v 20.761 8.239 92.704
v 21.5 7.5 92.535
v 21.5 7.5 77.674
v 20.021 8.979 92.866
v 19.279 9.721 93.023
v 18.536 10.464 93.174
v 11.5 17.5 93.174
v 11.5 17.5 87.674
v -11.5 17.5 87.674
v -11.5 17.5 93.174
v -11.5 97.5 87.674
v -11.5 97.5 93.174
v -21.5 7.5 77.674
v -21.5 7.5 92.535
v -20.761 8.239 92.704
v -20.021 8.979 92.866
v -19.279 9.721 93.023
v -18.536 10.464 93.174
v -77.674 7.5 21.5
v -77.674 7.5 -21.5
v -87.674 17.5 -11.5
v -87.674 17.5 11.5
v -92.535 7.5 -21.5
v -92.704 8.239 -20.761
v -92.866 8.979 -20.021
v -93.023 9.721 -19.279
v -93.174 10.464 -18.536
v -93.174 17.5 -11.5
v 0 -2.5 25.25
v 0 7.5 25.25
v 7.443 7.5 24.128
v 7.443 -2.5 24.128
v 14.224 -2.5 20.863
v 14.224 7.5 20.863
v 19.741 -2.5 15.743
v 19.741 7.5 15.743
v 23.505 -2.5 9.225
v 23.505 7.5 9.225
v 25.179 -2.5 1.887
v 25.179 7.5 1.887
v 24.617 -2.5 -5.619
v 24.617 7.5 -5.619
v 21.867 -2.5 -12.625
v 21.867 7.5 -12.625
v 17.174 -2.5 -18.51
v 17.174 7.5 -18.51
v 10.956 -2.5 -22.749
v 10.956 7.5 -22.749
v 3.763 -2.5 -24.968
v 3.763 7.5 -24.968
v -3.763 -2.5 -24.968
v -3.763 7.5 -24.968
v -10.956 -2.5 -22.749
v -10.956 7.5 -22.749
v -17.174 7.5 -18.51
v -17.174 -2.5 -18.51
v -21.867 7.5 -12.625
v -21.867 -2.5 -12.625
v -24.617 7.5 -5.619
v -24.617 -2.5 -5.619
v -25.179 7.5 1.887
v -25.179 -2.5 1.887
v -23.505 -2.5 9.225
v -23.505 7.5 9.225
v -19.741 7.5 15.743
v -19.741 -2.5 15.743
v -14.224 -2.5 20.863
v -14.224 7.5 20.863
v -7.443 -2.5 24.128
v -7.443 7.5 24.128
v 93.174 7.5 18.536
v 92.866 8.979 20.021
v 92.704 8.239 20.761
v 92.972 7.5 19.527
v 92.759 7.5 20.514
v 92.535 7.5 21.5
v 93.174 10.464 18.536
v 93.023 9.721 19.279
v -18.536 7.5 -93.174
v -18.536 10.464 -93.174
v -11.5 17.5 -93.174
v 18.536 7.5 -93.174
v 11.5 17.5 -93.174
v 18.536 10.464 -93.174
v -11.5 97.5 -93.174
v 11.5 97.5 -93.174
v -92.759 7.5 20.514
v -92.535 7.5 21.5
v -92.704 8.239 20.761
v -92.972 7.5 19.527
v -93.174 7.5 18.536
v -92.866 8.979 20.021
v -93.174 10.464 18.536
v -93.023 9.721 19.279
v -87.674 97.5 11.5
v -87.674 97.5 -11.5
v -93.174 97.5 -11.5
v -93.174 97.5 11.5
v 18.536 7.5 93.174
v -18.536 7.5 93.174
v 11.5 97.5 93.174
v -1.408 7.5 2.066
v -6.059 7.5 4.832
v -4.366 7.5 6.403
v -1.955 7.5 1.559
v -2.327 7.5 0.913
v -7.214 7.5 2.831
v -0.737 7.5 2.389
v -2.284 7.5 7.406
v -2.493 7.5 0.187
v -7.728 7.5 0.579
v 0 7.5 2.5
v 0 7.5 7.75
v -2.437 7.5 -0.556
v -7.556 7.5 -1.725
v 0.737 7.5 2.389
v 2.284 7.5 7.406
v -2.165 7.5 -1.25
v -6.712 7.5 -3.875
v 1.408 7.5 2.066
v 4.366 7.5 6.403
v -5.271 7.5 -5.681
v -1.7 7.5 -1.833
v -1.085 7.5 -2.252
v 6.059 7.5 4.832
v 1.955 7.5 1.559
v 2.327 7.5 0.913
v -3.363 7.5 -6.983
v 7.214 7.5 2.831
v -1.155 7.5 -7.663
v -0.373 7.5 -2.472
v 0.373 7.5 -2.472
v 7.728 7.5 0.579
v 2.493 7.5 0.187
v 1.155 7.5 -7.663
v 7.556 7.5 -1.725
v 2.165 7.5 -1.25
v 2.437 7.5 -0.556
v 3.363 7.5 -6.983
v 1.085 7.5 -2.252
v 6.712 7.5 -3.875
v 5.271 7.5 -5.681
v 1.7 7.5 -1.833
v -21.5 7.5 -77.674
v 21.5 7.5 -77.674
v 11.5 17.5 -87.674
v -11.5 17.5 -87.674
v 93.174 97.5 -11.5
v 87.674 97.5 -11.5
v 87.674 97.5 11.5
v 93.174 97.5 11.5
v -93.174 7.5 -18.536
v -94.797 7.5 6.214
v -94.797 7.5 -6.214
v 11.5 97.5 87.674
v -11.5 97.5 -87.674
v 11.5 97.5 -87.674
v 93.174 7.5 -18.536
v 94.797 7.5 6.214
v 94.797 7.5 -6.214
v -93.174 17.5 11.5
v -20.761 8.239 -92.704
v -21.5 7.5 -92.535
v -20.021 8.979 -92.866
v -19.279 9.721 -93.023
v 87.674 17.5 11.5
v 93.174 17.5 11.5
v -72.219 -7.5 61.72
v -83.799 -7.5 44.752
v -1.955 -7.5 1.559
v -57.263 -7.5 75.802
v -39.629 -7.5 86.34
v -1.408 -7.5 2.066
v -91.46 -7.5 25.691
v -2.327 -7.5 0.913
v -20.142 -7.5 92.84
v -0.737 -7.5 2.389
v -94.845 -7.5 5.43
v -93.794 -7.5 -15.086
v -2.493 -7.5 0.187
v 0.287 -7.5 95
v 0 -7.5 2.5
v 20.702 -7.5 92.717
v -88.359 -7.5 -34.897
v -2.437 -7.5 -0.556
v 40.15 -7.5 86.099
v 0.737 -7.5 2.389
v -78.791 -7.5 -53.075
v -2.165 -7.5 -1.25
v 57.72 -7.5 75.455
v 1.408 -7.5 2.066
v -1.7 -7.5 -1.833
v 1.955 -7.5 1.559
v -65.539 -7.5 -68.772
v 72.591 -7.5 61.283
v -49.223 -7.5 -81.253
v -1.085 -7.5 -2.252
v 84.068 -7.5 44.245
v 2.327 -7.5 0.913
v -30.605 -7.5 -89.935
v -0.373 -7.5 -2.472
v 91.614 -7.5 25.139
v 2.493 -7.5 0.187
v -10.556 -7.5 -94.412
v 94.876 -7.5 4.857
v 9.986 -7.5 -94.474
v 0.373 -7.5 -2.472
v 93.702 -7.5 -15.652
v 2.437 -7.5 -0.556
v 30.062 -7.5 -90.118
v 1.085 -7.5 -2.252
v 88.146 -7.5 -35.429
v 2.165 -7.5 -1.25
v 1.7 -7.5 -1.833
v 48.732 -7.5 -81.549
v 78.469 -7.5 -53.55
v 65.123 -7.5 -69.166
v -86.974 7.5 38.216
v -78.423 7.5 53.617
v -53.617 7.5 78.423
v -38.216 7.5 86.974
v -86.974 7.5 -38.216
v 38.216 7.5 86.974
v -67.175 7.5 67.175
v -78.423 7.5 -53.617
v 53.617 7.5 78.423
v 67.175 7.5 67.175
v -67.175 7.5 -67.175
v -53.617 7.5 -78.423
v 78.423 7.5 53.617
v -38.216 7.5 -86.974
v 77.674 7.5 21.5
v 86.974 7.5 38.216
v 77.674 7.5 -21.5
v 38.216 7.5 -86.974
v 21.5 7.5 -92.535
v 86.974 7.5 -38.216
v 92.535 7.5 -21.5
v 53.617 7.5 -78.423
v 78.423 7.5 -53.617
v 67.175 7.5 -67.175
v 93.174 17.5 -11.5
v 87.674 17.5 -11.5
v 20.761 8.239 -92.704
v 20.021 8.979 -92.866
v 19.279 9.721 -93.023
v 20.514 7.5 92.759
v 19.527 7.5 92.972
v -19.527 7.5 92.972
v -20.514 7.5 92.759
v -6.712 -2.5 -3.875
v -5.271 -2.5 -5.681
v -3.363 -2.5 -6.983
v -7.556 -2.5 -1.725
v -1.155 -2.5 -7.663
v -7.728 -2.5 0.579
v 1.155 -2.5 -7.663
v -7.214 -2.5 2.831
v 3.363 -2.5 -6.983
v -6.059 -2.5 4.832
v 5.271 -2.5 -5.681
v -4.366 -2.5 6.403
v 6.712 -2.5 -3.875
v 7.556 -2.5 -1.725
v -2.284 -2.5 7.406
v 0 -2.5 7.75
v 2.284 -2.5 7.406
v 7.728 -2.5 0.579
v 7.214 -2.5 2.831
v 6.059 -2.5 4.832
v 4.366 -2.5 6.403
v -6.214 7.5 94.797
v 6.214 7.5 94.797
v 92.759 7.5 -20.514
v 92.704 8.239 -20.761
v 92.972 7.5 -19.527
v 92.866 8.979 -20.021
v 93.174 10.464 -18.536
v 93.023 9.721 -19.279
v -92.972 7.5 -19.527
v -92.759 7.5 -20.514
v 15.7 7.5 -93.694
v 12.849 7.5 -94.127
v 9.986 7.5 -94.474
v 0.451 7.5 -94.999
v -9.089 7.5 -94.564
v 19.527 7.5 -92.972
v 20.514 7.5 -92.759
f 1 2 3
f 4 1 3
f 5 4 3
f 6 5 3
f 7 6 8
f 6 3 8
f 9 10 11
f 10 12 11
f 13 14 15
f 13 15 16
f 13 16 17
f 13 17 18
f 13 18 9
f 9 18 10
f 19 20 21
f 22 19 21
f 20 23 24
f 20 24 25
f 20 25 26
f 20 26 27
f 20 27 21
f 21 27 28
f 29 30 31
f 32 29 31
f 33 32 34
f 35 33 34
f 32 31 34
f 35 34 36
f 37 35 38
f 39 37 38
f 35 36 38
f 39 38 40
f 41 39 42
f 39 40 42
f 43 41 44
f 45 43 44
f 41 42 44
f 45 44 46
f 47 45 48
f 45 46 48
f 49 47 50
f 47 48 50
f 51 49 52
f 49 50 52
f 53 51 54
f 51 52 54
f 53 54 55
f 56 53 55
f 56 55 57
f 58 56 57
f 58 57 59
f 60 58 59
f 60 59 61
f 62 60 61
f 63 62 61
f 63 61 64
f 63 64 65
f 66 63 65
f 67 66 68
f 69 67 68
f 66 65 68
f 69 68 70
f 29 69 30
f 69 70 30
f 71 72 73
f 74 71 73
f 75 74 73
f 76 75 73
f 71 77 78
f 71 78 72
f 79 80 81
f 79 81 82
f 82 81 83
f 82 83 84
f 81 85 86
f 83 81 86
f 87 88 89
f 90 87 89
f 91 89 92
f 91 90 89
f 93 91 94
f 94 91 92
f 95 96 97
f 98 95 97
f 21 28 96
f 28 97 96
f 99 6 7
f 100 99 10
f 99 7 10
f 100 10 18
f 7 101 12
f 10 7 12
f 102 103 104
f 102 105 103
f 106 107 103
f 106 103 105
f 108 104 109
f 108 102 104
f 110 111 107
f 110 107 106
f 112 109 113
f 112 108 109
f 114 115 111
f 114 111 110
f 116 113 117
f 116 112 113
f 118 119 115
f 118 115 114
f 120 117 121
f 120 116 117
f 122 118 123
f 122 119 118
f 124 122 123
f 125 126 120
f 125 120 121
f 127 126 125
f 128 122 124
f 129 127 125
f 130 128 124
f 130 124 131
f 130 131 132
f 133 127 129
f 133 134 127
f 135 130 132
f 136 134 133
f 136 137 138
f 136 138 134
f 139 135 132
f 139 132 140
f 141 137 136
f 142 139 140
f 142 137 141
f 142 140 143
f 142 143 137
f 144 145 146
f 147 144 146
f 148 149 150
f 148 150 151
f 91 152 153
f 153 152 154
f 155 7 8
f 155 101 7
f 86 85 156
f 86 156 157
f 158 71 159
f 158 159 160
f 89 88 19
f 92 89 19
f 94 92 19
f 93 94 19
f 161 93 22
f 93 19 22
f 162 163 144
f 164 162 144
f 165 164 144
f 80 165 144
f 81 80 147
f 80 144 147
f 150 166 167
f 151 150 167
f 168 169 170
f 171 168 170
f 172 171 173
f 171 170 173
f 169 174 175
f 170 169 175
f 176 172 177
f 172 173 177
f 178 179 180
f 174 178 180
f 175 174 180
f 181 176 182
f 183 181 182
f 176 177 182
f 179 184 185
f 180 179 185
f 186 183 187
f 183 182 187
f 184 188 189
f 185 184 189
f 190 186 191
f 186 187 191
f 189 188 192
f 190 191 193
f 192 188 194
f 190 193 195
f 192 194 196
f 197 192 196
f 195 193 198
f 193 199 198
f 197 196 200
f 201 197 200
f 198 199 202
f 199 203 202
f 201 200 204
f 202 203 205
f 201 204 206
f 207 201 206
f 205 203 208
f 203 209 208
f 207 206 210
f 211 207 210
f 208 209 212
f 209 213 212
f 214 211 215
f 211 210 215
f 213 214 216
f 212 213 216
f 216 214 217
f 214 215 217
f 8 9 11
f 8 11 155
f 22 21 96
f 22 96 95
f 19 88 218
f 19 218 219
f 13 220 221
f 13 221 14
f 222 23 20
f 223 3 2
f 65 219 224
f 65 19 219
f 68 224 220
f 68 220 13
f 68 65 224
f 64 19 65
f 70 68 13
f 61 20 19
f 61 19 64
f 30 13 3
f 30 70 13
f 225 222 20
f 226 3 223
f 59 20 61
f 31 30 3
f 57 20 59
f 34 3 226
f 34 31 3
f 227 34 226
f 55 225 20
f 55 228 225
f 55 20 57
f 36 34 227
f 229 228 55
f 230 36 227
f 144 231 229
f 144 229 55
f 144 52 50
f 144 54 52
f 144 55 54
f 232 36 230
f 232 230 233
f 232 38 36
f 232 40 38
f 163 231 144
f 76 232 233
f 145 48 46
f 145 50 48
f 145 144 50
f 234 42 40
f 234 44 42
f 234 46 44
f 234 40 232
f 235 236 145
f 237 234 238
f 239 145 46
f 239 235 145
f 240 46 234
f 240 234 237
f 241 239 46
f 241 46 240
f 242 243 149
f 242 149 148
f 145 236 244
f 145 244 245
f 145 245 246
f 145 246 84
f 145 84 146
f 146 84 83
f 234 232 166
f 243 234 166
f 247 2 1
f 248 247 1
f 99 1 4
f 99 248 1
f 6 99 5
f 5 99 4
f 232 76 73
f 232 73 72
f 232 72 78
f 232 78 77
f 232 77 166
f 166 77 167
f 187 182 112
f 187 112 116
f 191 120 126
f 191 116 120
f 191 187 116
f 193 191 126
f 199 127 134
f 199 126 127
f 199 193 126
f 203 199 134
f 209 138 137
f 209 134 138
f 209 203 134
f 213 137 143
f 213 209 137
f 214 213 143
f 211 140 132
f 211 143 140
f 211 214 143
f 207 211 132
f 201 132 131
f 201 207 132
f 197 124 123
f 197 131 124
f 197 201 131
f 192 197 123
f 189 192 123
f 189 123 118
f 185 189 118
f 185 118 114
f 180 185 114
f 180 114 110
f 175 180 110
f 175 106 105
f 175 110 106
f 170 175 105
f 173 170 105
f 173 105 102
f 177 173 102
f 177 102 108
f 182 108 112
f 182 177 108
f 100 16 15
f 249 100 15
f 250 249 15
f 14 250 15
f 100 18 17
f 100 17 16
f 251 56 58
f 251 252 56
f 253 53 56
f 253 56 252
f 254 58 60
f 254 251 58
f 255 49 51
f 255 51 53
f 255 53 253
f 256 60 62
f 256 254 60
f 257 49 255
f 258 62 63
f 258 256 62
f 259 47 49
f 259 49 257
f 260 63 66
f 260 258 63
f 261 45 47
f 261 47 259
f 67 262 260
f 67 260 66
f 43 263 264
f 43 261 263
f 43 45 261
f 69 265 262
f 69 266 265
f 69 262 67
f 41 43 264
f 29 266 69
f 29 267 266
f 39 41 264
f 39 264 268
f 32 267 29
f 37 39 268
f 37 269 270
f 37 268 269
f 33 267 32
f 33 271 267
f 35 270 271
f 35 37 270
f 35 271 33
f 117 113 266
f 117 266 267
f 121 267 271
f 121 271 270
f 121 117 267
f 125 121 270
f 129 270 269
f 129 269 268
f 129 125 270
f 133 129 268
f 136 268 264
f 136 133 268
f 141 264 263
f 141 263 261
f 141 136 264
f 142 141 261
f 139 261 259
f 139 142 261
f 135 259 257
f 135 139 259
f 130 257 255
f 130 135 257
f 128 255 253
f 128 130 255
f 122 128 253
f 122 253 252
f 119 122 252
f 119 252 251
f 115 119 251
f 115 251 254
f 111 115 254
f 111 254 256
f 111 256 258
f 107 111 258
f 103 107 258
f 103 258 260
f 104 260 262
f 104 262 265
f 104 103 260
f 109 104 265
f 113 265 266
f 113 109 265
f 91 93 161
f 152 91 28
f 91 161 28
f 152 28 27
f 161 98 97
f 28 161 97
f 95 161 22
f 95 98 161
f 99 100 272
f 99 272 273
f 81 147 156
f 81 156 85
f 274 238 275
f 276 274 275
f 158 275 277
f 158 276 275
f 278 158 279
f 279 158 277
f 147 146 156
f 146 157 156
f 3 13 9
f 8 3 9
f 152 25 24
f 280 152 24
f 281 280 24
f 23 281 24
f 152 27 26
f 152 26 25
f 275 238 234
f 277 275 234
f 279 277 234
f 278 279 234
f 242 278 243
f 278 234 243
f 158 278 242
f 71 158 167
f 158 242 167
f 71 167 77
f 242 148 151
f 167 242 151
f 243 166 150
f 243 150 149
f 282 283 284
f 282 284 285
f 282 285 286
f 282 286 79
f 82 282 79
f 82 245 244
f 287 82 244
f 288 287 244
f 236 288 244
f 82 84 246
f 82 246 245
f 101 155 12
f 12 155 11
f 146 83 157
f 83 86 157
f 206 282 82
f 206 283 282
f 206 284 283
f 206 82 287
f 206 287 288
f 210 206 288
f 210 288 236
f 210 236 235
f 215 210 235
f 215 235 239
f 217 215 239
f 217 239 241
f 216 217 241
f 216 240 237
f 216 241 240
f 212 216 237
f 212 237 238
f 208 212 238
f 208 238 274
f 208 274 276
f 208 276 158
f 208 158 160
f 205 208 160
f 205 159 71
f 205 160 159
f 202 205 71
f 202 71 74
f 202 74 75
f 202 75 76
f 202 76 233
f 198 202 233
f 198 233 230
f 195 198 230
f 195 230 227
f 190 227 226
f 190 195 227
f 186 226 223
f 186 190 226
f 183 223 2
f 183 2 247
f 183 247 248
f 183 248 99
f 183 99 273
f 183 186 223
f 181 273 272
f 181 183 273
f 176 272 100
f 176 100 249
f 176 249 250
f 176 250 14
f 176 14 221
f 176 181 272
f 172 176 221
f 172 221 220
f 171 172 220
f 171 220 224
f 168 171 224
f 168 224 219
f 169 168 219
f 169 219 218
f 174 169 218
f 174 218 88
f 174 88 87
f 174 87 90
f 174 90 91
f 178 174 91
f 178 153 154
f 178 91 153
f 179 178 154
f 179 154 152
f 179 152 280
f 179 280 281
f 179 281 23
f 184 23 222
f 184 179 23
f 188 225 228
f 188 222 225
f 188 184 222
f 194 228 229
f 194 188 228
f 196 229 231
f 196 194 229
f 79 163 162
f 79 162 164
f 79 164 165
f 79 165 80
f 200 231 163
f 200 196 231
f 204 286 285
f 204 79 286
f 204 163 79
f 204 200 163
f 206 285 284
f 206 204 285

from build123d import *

# Parameters (mm, degrees)
BOSS_EXTRUDE1_DEPTH     = 7.5
SKETCH2_W               = 23
SKETCH2_H               = 5.500000000000014
SKETCH2_W_2             = 5.5
SKETCH2_H_2             = 23
BOSS_EXTRUDE2_DEPTH     = 90
SKETCH3_R               = 25.25
SKETCH3_R_2             = 7.75
CUT_EXTRUDE1_DEPTH      = 10
CUT_EXTRUDE2_DEPTH      = 162.70961628796235
CUT_EXTRUDE2_DEPTH_BACK = 162.70961628796235
SKETCH4_R               = 2.5
CHAMFER1_SIZE           = 10


with BuildPart() as part:
    # Sketch1 → Boss-Extrude1 (new, symmetric)
    with BuildSketch(Plane(origin=(0, 0, 0), x_dir=(1, 0, 0), z_dir=(0, 1, 0))):
        with BuildLine():
            ThreePointArc((-9.98613997947909, 94.47368421052632), (-82.27241335952168, 47.49999999999999), (-86.80968050516414, -38.58859119728691))
            ThreePointArc((-86.80968050516414, -38.58859119728691), (-82.27241335952166, -47.500000000000036), (-76.82354052568505, -55.885093013239505))
            ThreePointArc((-76.82354052568505, -55.885093013239505), (4.801e-14, -95.00000000000001), (76.82354052568508, -55.88509301323945))
            ThreePointArc((76.82354052568508, -55.88509301323945), (82.2724133595217, -47.499999999999986), (86.80968050516417, -38.58859119728684))
            ThreePointArc((86.80968050516417, -38.58859119728684), (82.27241335952168, 47.50000000000001), (9.986139979479082, 94.47368421052632))
            ThreePointArc((9.986139979479082, 94.47368421052632), (5.82e-15, 95), (-9.98613997947909, 94.47368421052632))
        make_face()
    extrude(amount=BOSS_EXTRUDE1_DEPTH, both=True)

    # Sketch2 → Boss-Extrude2 (add)
    with BuildSketch(Plane(origin=(0, 7.5, 0), x_dir=(1, 0, 0), z_dir=(0, 1, 0))):
        with Locations((0, 90.42404100918682)):
            Rectangle(SKETCH2_W, SKETCH2_H)
        with Locations((90.42404100918962, 2.14584e-12)):
            Rectangle(SKETCH2_W_2, SKETCH2_H_2)
        Polygon((11.50000000000496, -93.17404100918749), (-11.49999999999504, -93.17404100918749), (-11.499999999995042, -87.67404100918748), (11.500000000004958, -87.67404100918748), align=None)
        Polygon((-93.17404100918469, -11.500000000002824), (-93.17404100918469, 11.499999999997176), (-87.67404100918468, 11.499999999997177), (-87.67404100918468, -11.500000000002823), align=None)
    extrude(amount=BOSS_EXTRUDE2_DEPTH)

    # Sketch3 → Cut-Extrude1 (cut)
    with BuildSketch(Plane(origin=(0, 7.5, 0), x_dir=(1, 0, 0), z_dir=(0, 1, 0))):
        with Locations(Location((0, 0, 0), (0, 0, 270))):
            Circle(SKETCH3_R)
        with Locations(Location((0, 0, 0), (0, 0, 270))):
            Circle(SKETCH3_R_2, mode=Mode.SUBTRACT)
    extrude(amount=-CUT_EXTRUDE1_DEPTH, mode=Mode.SUBTRACT)

    # Sketch4 → Cut-Extrude2 (cut, two sides: drawn at the far end of the back side and taken through both)
    with BuildSketch(Plane(origin=(0, 7.5, 0), x_dir=(1, 0, 0), z_dir=(0, 1, 0)).offset(-CUT_EXTRUDE2_DEPTH_BACK)):
        with Locations(Location((0, 0, 0), (0, 0, 270))):
            Circle(SKETCH4_R)
    extrude(amount=CUT_EXTRUDE2_DEPTH + CUT_EXTRUDE2_DEPTH_BACK, mode=Mode.SUBTRACT)

    # Chamfer1
    # the kernel refuses this chamfer: 10 mm, written as the material it adds along each edge
    with BuildSketch(Plane(origin=(-11.5, 7.5, -87.67404100918681), x_dir=(-0.9996219169112968, -0.027495876610586403, 0), z_dir=(0, 0, -1))) as chamfer1_piece_1_section:
        Polygon((CHAMFER1_SIZE * 0.999621916911, CHAMFER1_SIZE * 0.0274958766106), (-CHAMFER1_SIZE * 0.0274958766106, CHAMFER1_SIZE * 0.999621916911), (0, 0), align=None)
    chamfer1_piece_1 = extrude(amount=5.500000000000014, mode=Mode.PRIVATE)
    chamfer1_piece_1 = chamfer1_piece_1 & Plane(origin=(-7.11e-15, 10.81050074609558, 2.265e-14), x_dir=(-0.10511726294188506, 0, -0.9944598337950139), z_dir=(0, -1, 0)) * Cylinder(95, 51, mode=Mode.PRIVATE)
    add(chamfer1_piece_1)
    with BuildSketch(Plane(origin=(11.5, 7.5, -87.67404100918681), x_dir=(0, -0.027495876610586403, 0.9996219169112968), z_dir=(-1, 0, 0)), Plane(origin=(87.67404100918962, 7.5, 11.499999999997854), x_dir=(-0.9996219169112968, -0.027495876610586403, 0), z_dir=(0, 0, -1)), Plane(origin=(-11.499999999995042, 7.5, 87.67404100918748), x_dir=(0, -0.027495876610586403, -0.9996219169112968), z_dir=(1, 0, 0)), Plane(origin=(-87.67404100918468, 7.5, -11.499999999997177), x_dir=(0.9996219169112968, -0.027495876610586403, 0), z_dir=(0, 0, 1))) as chamfer1_piece_2:
        Polygon((CHAMFER1_SIZE * 0.999621916911, CHAMFER1_SIZE * 0.0274958766106), (-CHAMFER1_SIZE * 0.0274958766106, CHAMFER1_SIZE * 0.999621916911), (0, 0), align=None)
    extrude(amount=23)
    with BuildSketch(Plane(origin=(11.5, 7.5, -93.17404100918682), x_dir=(0.9996219169112968, -0.027495876610586403, 0), z_dir=(0, 0, 1))) as chamfer1_piece_3_section:
        Polygon((CHAMFER1_SIZE * 0.999621916911, CHAMFER1_SIZE * 0.0274958766106), (-CHAMFER1_SIZE * 0.0274958766106, CHAMFER1_SIZE * 0.999621916911), (0, 0), align=None)
    chamfer1_piece_3 = extrude(amount=5.500000000000014, mode=Mode.PRIVATE)
    chamfer1_piece_3 = chamfer1_piece_3 & Plane(origin=(-7.11e-15, 10.810500746107277, 1.066e-14), x_dir=(0.9137861105806754, 0, 0.4061956968135455), z_dir=(0, -1, 0)) * Cylinder(95.00000000000001, 51, mode=Mode.PRIVATE)
    add(chamfer1_piece_3)
    with BuildSketch(Plane(origin=(87.67404100918962, 7.5, -11.500000000002146), x_dir=(0, -0.027495876610586403, -0.9996219169112968), z_dir=(1, 0, 0))) as chamfer1_piece_4_section:
        Polygon((CHAMFER1_SIZE * 0.999621916911, CHAMFER1_SIZE * 0.0274958766106), (-CHAMFER1_SIZE * 0.0274958766106, CHAMFER1_SIZE * 0.999621916911), (0, 0), align=None)
    chamfer1_piece_4 = extrude(amount=5.500000000000014, mode=Mode.PRIVATE)
    chamfer1_piece_4 = chamfer1_piece_4 & Plane(origin=(-7.11e-15, 10.81050074609573, 1.066e-14), x_dir=(0.9137861105806754, 0, 0.4061956968135455), z_dir=(0, -1, 0)) * Cylinder(95.00000000000001, 51, mode=Mode.PRIVATE)
    add(chamfer1_piece_4)
    with BuildSketch(Plane(origin=(93.17404100918964, 7.5, 11.499999999997854), x_dir=(0, -0.027495876610586403, 0.9996219169112968), z_dir=(-1, 0, 0))) as chamfer1_piece_5_section:
        Polygon((CHAMFER1_SIZE * 0.999621916911, CHAMFER1_SIZE * 0.0274958766106), (-CHAMFER1_SIZE * 0.0274958766106, CHAMFER1_SIZE * 0.999621916911), (0, 0), align=None)
    chamfer1_piece_5 = extrude(amount=5.500000000000014, mode=Mode.PRIVATE)
    chamfer1_piece_5 = chamfer1_piece_5 & Plane(origin=(-7.11e-15, 10.81050074610739, 1.066e-14), x_dir=(0.9137861105806754, 0, 0.4061956968135455), z_dir=(0, -1, 0)) * Cylinder(95.00000000000001, 51, mode=Mode.PRIVATE)
    add(chamfer1_piece_5)
    with BuildSketch(Plane(origin=(11.500000000004958, 7.5, 87.67404100918748), x_dir=(0.9996219169112968, -0.0274958766105864, 0), z_dir=(3.2e-16, 0, 1))) as chamfer1_piece_6_section:
        Polygon((CHAMFER1_SIZE * 0.999621916911, CHAMFER1_SIZE * 0.0274958766106), (-CHAMFER1_SIZE * 0.0274958766106, CHAMFER1_SIZE * 0.999621916911), (0, 0), align=None)
    chamfer1_piece_6 = extrude(amount=5.500000000000014, mode=Mode.PRIVATE)
    chamfer1_piece_6 = chamfer1_piece_6 & Plane(origin=(-7.11e-15, 10.810500746095684, 4.263e-14), x_dir=(-0.8086688476387901, 0, 0.5882641369814681), z_dir=(0, -1, 0)) * Cylinder(94.99999999999999, 51, mode=Mode.PRIVATE)
    add(chamfer1_piece_6)
    with BuildSketch(Plane(origin=(-11.49999999999504, 7.5, 93.17404100918749), x_dir=(-0.9996219169112968, -0.027495876610586403, 0), z_dir=(-3.2e-16, 0, -1))) as chamfer1_piece_7_section:
        Polygon((CHAMFER1_SIZE * 0.999621916911, CHAMFER1_SIZE * 0.0274958766106), (-CHAMFER1_SIZE * 0.0274958766106, CHAMFER1_SIZE * 0.999621916911), (0, 0), align=None)
    chamfer1_piece_7 = extrude(amount=5.500000000000014, mode=Mode.PRIVATE)
    chamfer1_piece_7 = chamfer1_piece_7 & Plane(origin=(-7.11e-15, 10.810500746107264, 4.263e-14), x_dir=(-0.8086688476387901, 0, 0.5882641369814681), z_dir=(0, -1, 0)) * Cylinder(94.99999999999999, 51, mode=Mode.PRIVATE)
    add(chamfer1_piece_7)
    with BuildSketch(Plane(origin=(-87.67404100918468, 7.5, 11.500000000002823), x_dir=(0, -0.02749587661058641, 0.9996219169112968), z_dir=(-1, 0, 3.2e-16))) as chamfer1_piece_8_section:
        Polygon((CHAMFER1_SIZE * 0.999621916911, CHAMFER1_SIZE * 0.0274958766106), (-CHAMFER1_SIZE * 0.0274958766106, CHAMFER1_SIZE * 0.999621916911), (0, 0), align=None)
    chamfer1_piece_8 = extrude(amount=5.500000000000014, mode=Mode.PRIVATE)
    chamfer1_piece_8 = chamfer1_piece_8 & Plane(origin=(-7.11e-15, 10.8105007460955, 2.265e-14), x_dir=(-0.10511726294188506, 0, -0.9944598337950139), z_dir=(0, -1, 0)) * Cylinder(95, 51, mode=Mode.PRIVATE)
    add(chamfer1_piece_8)
    with BuildSketch(Plane(origin=(-93.17404100918469, 7.5, -11.499999999997176), x_dir=(0, -0.027495876610586403, -0.9996219169112968), z_dir=(1, 0, -3.2e-16))) as chamfer1_piece_9_section:
        Polygon((CHAMFER1_SIZE * 0.999621916911, CHAMFER1_SIZE * 0.0274958766106), (-CHAMFER1_SIZE * 0.0274958766106, CHAMFER1_SIZE * 0.999621916911), (0, 0), align=None)
    chamfer1_piece_9 = extrude(amount=5.500000000000014, mode=Mode.PRIVATE)
    chamfer1_piece_9 = chamfer1_piece_9 & Plane(origin=(-7.11e-15, 10.810500746107152, 2.265e-14), x_dir=(-0.10511726294188506, 0, -0.9944598337950139), z_dir=(0, -1, 0)) * Cylinder(95, 51, mode=Mode.PRIVATE)
    add(chamfer1_piece_9)
    with BuildSketch(Plane(origin=(-11.5, 7.5, -61.9572111295277), x_dir=(-0.9996219169112968, -0.027495876610586403, 0), z_dir=(0, 0, -1))) as chamfer1_piece_10a_section:
        Polygon((CHAMFER1_SIZE * 0.999621916911, CHAMFER1_SIZE * 0.0274958766106), (-CHAMFER1_SIZE * 0.0274958766106, CHAMFER1_SIZE * 0.999621916911), (0, 0), align=None)
    chamfer1_piece_10a = extrude(amount=31.216829879659123, mode=Mode.PRIVATE)
    chamfer1_piece_10a = split(chamfer1_piece_10a, bisect_by=Plane(origin=(-14.797936268059384, 10.797936268059397, -87.67404100918681), z_dir=(0, 0, 1)), keep=Keep.TOP, mode=Mode.PRIVATE)
    with BuildSketch(Plane(origin=(11.5, 7.5, -87.67404100918681), x_dir=(0, -0.027495876610586403, 0.9996219169112968), z_dir=(-1, 0, 0))) as chamfer1_piece_10b_section:
        Polygon((CHAMFER1_SIZE * 0.999621916911, CHAMFER1_SIZE * 0.0274958766106), (-CHAMFER1_SIZE * 0.0274958766106, CHAMFER1_SIZE * 0.999621916911), (0, 0), align=None)
    chamfer1_piece_10b = extrude(amount=48.7168298796591, mode=Mode.PRIVATE)
    chamfer1_piece_10b = chamfer1_piece_10b & Plane(origin=(-7.11e-15, 10.791626424571733, 1.066e-14), x_dir=(0.9137861105806754, 0, 0.4061956968135455), z_dir=(0, -1, 0)) * Cylinder(95.00000000000001, 138, mode=Mode.PRIVATE)
    chamfer1_piece_10b = split(chamfer1_piece_10b, bisect_by=Plane(origin=(-11.5, 10.791626424571733, -84.36813075127401), z_dir=(-1, 0, 0)), keep=Keep.TOP, mode=Mode.PRIVATE)
    chamfer1_piece_10 = chamfer1_piece_10a & chamfer1_piece_10b
    add(chamfer1_piece_10)
    with BuildSketch(Plane(origin=(37.2168298796591, 7.5, -87.67404100918681), x_dir=(0, -0.027495876610586403, 0.9996219169112968), z_dir=(-1, 0, 0))) as chamfer1_piece_11a_section:
        Polygon((CHAMFER1_SIZE * 0.999621916911, CHAMFER1_SIZE * 0.0274958766106), (-CHAMFER1_SIZE * 0.0274958766106, CHAMFER1_SIZE * 0.999621916911), (0, 0), align=None)
    chamfer1_piece_11a = extrude(amount=48.7168298796591, mode=Mode.PRIVATE)
    chamfer1_piece_11a = chamfer1_piece_11a & Plane(origin=(-7.11e-15, 10.791626424554309, 1.066e-14), x_dir=(0.9137861105806754, 0, 0.4061956968135455), z_dir=(0, -1, 0)) * Cylinder(95.00000000000001, 138, mode=Mode.PRIVATE)
    chamfer1_piece_11a = split(chamfer1_piece_11a, bisect_by=Plane(origin=(11.5, 10.791626424554309, -84.36813075125882), z_dir=(1, 0, 0)), keep=Keep.TOP, mode=Mode.PRIVATE)
    with BuildSketch(Plane(origin=(11.5, 7.5, -93.17404100918682), x_dir=(0.9996219169112968, -0.027495876610586403, 0), z_dir=(0, 0, 1))) as chamfer1_piece_11b_section:
        Polygon((CHAMFER1_SIZE * 0.999621916911, CHAMFER1_SIZE * 0.0274958766106), (-CHAMFER1_SIZE * 0.0274958766106, CHAMFER1_SIZE * 0.999621916911), (0, 0), align=None)
    chamfer1_piece_11b = extrude(amount=31.216829879659123, mode=Mode.PRIVATE)
    chamfer1_piece_11b = split(chamfer1_piece_11b, bisect_by=Plane(origin=(14.797936268059384, 10.797936268059397, -87.67404100918681), z_dir=(0, 0, 1)), keep=Keep.TOP, mode=Mode.PRIVATE)
    chamfer1_piece_11 = chamfer1_piece_11a & chamfer1_piece_11b
    add(chamfer1_piece_11)
    with BuildSketch(Plane(origin=(61.95721112953051, 7.5, -11.500000000002146), x_dir=(0, -0.027495876610586403, -0.9996219169112968), z_dir=(1, 0, 0))) as chamfer1_piece_12a_section:
        Polygon((CHAMFER1_SIZE * 0.999621916911, CHAMFER1_SIZE * 0.0274958766106), (-CHAMFER1_SIZE * 0.0274958766106, CHAMFER1_SIZE * 0.999621916911), (0, 0), align=None)
    chamfer1_piece_12a = extrude(amount=31.216829879659123, mode=Mode.PRIVATE)
    chamfer1_piece_12a = split(chamfer1_piece_12a, bisect_by=Plane(origin=(87.67404100918962, 10.797936268059399, -14.797936268061527), z_dir=(-1, 0, 0)), keep=Keep.TOP, mode=Mode.PRIVATE)
    with BuildSketch(Plane(origin=(87.67404100918962, 7.5, 11.499999999997854), x_dir=(-0.9996219169112968, -0.027495876610586403, 0), z_dir=(0, 0, -1))) as chamfer1_piece_12b_section:
        Polygon((CHAMFER1_SIZE * 0.999621916911, CHAMFER1_SIZE * 0.0274958766106), (-CHAMFER1_SIZE * 0.0274958766106, CHAMFER1_SIZE * 0.999621916911), (0, 0), align=None)
    chamfer1_piece_12b = extrude(amount=48.7168298796591, mode=Mode.PRIVATE)
    chamfer1_piece_12b = chamfer1_piece_12b & Plane(origin=(-7.11e-15, 10.791626424571684, 1.066e-14), x_dir=(0.9137861105806754, 0, 0.4061956968135455), z_dir=(0, -1, 0)) * Cylinder(95.00000000000001, 138, mode=Mode.PRIVATE)
    chamfer1_piece_12b = split(chamfer1_piece_12b, bisect_by=Plane(origin=(84.36813075127668, 10.791626424571684, -11.500000000002146), z_dir=(0, 0, -1)), keep=Keep.TOP, mode=Mode.PRIVATE)
    chamfer1_piece_12 = chamfer1_piece_12a & chamfer1_piece_12b
    add(chamfer1_piece_12)
    with BuildSketch(Plane(origin=(87.67404100918962, 7.5, 37.216829879656956), x_dir=(-0.9996219169112968, -0.027495876610586403, 0), z_dir=(0, 0, -1))) as chamfer1_piece_13a_section:
        Polygon((CHAMFER1_SIZE * 0.999621916911, CHAMFER1_SIZE * 0.0274958766106), (-CHAMFER1_SIZE * 0.0274958766106, CHAMFER1_SIZE * 0.999621916911), (0, 0), align=None)
    chamfer1_piece_13a = extrude(amount=48.7168298796591, mode=Mode.PRIVATE)
    chamfer1_piece_13a = chamfer1_piece_13a & Plane(origin=(-7.11e-15, 10.791626424553938, 1.066e-14), x_dir=(0.9137861105806754, 0, 0.4061956968135455), z_dir=(0, -1, 0)) * Cylinder(95.00000000000001, 138, mode=Mode.PRIVATE)
    chamfer1_piece_13a = split(chamfer1_piece_13a, bisect_by=Plane(origin=(84.36813075126396, 10.791626424553938, 11.499999999997854), z_dir=(0, 0, 1)), keep=Keep.TOP, mode=Mode.PRIVATE)
    with BuildSketch(Plane(origin=(93.17404100918964, 7.5, 11.499999999997854), x_dir=(0, -0.027495876610586403, 0.9996219169112968), z_dir=(-1, 0, 0))) as chamfer1_piece_13b_section:
        Polygon((CHAMFER1_SIZE * 0.999621916911, CHAMFER1_SIZE * 0.0274958766106), (-CHAMFER1_SIZE * 0.0274958766106, CHAMFER1_SIZE * 0.999621916911), (0, 0), align=None)
    chamfer1_piece_13b = extrude(amount=31.216829879659123, mode=Mode.PRIVATE)
    chamfer1_piece_13b = split(chamfer1_piece_13b, bisect_by=Plane(origin=(87.67404100918962, 10.797936268059402, 14.79793626805724), z_dir=(-1, 0, 0)), keep=Keep.TOP, mode=Mode.PRIVATE)
    chamfer1_piece_13 = chamfer1_piece_13a & chamfer1_piece_13b
    add(chamfer1_piece_13)
    with BuildSketch(Plane(origin=(11.500000000004949, 7.5, 61.95721112952837), x_dir=(0.9996219169112968, -0.027495876610586403, 0), z_dir=(3.2e-16, 0, 1))) as chamfer1_piece_14a_section:
        Polygon((CHAMFER1_SIZE * 0.999621916911, CHAMFER1_SIZE * 0.0274958766106), (-CHAMFER1_SIZE * 0.0274958766106, CHAMFER1_SIZE * 0.999621916911), (0, 0), align=None)
    chamfer1_piece_14a = extrude(amount=31.216829879659123, mode=Mode.PRIVATE)
    chamfer1_piece_14a = split(chamfer1_piece_14a, bisect_by=Plane(origin=(14.797936268064339, 10.797936268059399, 87.67404100918748), z_dir=(0, 0, -1)), keep=Keep.TOP, mode=Mode.PRIVATE)
    with BuildSketch(Plane(origin=(-11.499999999995042, 7.5, 87.67404100918748), x_dir=(0, -0.027495876610586403, -0.9996219169112968), z_dir=(1, 0, 0))) as chamfer1_piece_14b_section:
        Polygon((CHAMFER1_SIZE * 0.999621916911, CHAMFER1_SIZE * 0.0274958766106), (-CHAMFER1_SIZE * 0.0274958766106, CHAMFER1_SIZE * 0.999621916911), (0, 0), align=None)
    chamfer1_piece_14b = extrude(amount=48.7168298796591, mode=Mode.PRIVATE)
    chamfer1_piece_14b = chamfer1_piece_14b & Plane(origin=(-7.11e-15, 10.791626424571755, 4.263e-14), x_dir=(-0.8086688476387901, 0, 0.5882641369814681), z_dir=(0, -1, 0)) * Cylinder(94.99999999999999, 138, mode=Mode.PRIVATE)
    chamfer1_piece_14b = split(chamfer1_piece_14b, bisect_by=Plane(origin=(11.500000000004956, 10.791626424571755, 84.3681307512747), z_dir=(1, 0, -3.2e-16)), keep=Keep.TOP, mode=Mode.PRIVATE)
    chamfer1_piece_14 = chamfer1_piece_14a & chamfer1_piece_14b
    add(chamfer1_piece_14)
    with BuildSketch(Plane(origin=(-37.21682987965415, 7.5, 87.67404100918748), x_dir=(0, -0.027495876610586403, -0.9996219169112968), z_dir=(1, 0, 0))) as chamfer1_piece_15a_section:
        Polygon((CHAMFER1_SIZE * 0.999621916911, CHAMFER1_SIZE * 0.0274958766106), (-CHAMFER1_SIZE * 0.0274958766106, CHAMFER1_SIZE * 0.999621916911), (0, 0), align=None)
    chamfer1_piece_15a = extrude(amount=48.71682987965911, mode=Mode.PRIVATE)
    chamfer1_piece_15a = chamfer1_piece_15a & Plane(origin=(-7.11e-15, 10.791626424554186, 4.263e-14), x_dir=(-0.8086688476387901, 0, 0.5882641369814681), z_dir=(0, -1, 0)) * Cylinder(94.99999999999999, 138, mode=Mode.PRIVATE)
    chamfer1_piece_15a = split(chamfer1_piece_15a, bisect_by=Plane(origin=(-11.499999999995044, 10.791626424554186, 84.36813075126142), z_dir=(-1, 0, 3.2e-16)), keep=Keep.TOP, mode=Mode.PRIVATE)
    with BuildSketch(Plane(origin=(-11.49999999999504, 7.5, 93.17404100918749), x_dir=(-0.9996219169112968, -0.027495876610586403, 0), z_dir=(-3.2e-16, 0, -1))) as chamfer1_piece_15b_section:
        Polygon((CHAMFER1_SIZE * 0.999621916911, CHAMFER1_SIZE * 0.0274958766106), (-CHAMFER1_SIZE * 0.0274958766106, CHAMFER1_SIZE * 0.999621916911), (0, 0), align=None)
    chamfer1_piece_15b = extrude(amount=31.216829879659123, mode=Mode.PRIVATE)
    chamfer1_piece_15b = split(chamfer1_piece_15b, bisect_by=Plane(origin=(-14.797936268054428, 10.797936268059393, 87.67404100918748), z_dir=(0, 0, -1)), keep=Keep.TOP, mode=Mode.PRIVATE)
    chamfer1_piece_15 = chamfer1_piece_15a & chamfer1_piece_15b
    add(chamfer1_piece_15)
    with BuildSketch(Plane(origin=(-61.95721112952557, 7.5, 11.500000000002814), x_dir=(0, -0.027495876610586403, 0.9996219169112968), z_dir=(-1, 0, 3.2e-16))) as chamfer1_piece_16a_section:
        Polygon((CHAMFER1_SIZE * 0.999621916911, CHAMFER1_SIZE * 0.0274958766106), (-CHAMFER1_SIZE * 0.0274958766106, CHAMFER1_SIZE * 0.999621916911), (0, 0), align=None)
    chamfer1_piece_16a = extrude(amount=31.216829879659123, mode=Mode.PRIVATE)
    chamfer1_piece_16a = split(chamfer1_piece_16a, bisect_by=Plane(origin=(-87.67404100918468, 10.7979362680594, 14.797936268062196), z_dir=(1, 0, 0)), keep=Keep.TOP, mode=Mode.PRIVATE)
    with BuildSketch(Plane(origin=(-87.67404100918468, 7.5, -11.499999999997177), x_dir=(0.9996219169112968, -0.027495876610586403, 0), z_dir=(0, 0, 1))) as chamfer1_piece_16b_section:
        Polygon((CHAMFER1_SIZE * 0.999621916911, CHAMFER1_SIZE * 0.0274958766106), (-CHAMFER1_SIZE * 0.0274958766106, CHAMFER1_SIZE * 0.999621916911), (0, 0), align=None)
    chamfer1_piece_16b = extrude(amount=48.7168298796591, mode=Mode.PRIVATE)
    chamfer1_piece_16b = chamfer1_piece_16b & Plane(origin=(-7.11e-15, 10.791626424571803, 2.265e-14), x_dir=(-0.10511726294188506, 0, -0.9944598337950139), z_dir=(0, -1, 0)) * Cylinder(95, 138, mode=Mode.PRIVATE)
    chamfer1_piece_16b = split(chamfer1_piece_16b, bisect_by=Plane(origin=(-84.36813075127199, 10.791626424571803, 11.50000000000282), z_dir=(3.2e-16, 0, 1)), keep=Keep.TOP, mode=Mode.PRIVATE)
    chamfer1_piece_16 = chamfer1_piece_16a & chamfer1_piece_16b
    add(chamfer1_piece_16)
    with BuildSketch(Plane(origin=(-87.67404100918468, 7.5, -37.21682987965628), x_dir=(0.9996219169112968, -0.027495876610586403, 0), z_dir=(0, 0, 1))) as chamfer1_piece_17a_section:
        Polygon((CHAMFER1_SIZE * 0.999621916911, CHAMFER1_SIZE * 0.0274958766106), (-CHAMFER1_SIZE * 0.0274958766106, CHAMFER1_SIZE * 0.999621916911), (0, 0), align=None)
    chamfer1_piece_17a = extrude(amount=48.7168298796591, mode=Mode.PRIVATE)
    chamfer1_piece_17a = chamfer1_piece_17a & Plane(origin=(-7.11e-15, 10.791626424554211, 2.265e-14), x_dir=(-0.10511726294188506, 0, -0.9944598337950139), z_dir=(0, -1, 0)) * Cylinder(95, 138, mode=Mode.PRIVATE)
    chamfer1_piece_17a = split(chamfer1_piece_17a, bisect_by=Plane(origin=(-84.36813075125824, 10.791626424554211, -11.49999999999718), z_dir=(-3.2e-16, 0, -1)), keep=Keep.TOP, mode=Mode.PRIVATE)
    with BuildSketch(Plane(origin=(-93.17404100918469, 7.5, -11.499999999997176), x_dir=(0, -0.027495876610586403, -0.9996219169112968), z_dir=(1, 0, -3.2e-16))) as chamfer1_piece_17b_section:
        Polygon((CHAMFER1_SIZE * 0.999621916911, CHAMFER1_SIZE * 0.0274958766106), (-CHAMFER1_SIZE * 0.0274958766106, CHAMFER1_SIZE * 0.999621916911), (0, 0), align=None)
    chamfer1_piece_17b = extrude(amount=31.216829879659123, mode=Mode.PRIVATE)
    chamfer1_piece_17b = split(chamfer1_piece_17b, bisect_by=Plane(origin=(-87.67404100918468, 10.797936268059397, -14.79793626805656), z_dir=(1, 0, 0)), keep=Keep.TOP, mode=Mode.PRIVATE)
    chamfer1_piece_17 = chamfer1_piece_17a & chamfer1_piece_17b
    add(chamfer1_piece_17)


solid = part.part
